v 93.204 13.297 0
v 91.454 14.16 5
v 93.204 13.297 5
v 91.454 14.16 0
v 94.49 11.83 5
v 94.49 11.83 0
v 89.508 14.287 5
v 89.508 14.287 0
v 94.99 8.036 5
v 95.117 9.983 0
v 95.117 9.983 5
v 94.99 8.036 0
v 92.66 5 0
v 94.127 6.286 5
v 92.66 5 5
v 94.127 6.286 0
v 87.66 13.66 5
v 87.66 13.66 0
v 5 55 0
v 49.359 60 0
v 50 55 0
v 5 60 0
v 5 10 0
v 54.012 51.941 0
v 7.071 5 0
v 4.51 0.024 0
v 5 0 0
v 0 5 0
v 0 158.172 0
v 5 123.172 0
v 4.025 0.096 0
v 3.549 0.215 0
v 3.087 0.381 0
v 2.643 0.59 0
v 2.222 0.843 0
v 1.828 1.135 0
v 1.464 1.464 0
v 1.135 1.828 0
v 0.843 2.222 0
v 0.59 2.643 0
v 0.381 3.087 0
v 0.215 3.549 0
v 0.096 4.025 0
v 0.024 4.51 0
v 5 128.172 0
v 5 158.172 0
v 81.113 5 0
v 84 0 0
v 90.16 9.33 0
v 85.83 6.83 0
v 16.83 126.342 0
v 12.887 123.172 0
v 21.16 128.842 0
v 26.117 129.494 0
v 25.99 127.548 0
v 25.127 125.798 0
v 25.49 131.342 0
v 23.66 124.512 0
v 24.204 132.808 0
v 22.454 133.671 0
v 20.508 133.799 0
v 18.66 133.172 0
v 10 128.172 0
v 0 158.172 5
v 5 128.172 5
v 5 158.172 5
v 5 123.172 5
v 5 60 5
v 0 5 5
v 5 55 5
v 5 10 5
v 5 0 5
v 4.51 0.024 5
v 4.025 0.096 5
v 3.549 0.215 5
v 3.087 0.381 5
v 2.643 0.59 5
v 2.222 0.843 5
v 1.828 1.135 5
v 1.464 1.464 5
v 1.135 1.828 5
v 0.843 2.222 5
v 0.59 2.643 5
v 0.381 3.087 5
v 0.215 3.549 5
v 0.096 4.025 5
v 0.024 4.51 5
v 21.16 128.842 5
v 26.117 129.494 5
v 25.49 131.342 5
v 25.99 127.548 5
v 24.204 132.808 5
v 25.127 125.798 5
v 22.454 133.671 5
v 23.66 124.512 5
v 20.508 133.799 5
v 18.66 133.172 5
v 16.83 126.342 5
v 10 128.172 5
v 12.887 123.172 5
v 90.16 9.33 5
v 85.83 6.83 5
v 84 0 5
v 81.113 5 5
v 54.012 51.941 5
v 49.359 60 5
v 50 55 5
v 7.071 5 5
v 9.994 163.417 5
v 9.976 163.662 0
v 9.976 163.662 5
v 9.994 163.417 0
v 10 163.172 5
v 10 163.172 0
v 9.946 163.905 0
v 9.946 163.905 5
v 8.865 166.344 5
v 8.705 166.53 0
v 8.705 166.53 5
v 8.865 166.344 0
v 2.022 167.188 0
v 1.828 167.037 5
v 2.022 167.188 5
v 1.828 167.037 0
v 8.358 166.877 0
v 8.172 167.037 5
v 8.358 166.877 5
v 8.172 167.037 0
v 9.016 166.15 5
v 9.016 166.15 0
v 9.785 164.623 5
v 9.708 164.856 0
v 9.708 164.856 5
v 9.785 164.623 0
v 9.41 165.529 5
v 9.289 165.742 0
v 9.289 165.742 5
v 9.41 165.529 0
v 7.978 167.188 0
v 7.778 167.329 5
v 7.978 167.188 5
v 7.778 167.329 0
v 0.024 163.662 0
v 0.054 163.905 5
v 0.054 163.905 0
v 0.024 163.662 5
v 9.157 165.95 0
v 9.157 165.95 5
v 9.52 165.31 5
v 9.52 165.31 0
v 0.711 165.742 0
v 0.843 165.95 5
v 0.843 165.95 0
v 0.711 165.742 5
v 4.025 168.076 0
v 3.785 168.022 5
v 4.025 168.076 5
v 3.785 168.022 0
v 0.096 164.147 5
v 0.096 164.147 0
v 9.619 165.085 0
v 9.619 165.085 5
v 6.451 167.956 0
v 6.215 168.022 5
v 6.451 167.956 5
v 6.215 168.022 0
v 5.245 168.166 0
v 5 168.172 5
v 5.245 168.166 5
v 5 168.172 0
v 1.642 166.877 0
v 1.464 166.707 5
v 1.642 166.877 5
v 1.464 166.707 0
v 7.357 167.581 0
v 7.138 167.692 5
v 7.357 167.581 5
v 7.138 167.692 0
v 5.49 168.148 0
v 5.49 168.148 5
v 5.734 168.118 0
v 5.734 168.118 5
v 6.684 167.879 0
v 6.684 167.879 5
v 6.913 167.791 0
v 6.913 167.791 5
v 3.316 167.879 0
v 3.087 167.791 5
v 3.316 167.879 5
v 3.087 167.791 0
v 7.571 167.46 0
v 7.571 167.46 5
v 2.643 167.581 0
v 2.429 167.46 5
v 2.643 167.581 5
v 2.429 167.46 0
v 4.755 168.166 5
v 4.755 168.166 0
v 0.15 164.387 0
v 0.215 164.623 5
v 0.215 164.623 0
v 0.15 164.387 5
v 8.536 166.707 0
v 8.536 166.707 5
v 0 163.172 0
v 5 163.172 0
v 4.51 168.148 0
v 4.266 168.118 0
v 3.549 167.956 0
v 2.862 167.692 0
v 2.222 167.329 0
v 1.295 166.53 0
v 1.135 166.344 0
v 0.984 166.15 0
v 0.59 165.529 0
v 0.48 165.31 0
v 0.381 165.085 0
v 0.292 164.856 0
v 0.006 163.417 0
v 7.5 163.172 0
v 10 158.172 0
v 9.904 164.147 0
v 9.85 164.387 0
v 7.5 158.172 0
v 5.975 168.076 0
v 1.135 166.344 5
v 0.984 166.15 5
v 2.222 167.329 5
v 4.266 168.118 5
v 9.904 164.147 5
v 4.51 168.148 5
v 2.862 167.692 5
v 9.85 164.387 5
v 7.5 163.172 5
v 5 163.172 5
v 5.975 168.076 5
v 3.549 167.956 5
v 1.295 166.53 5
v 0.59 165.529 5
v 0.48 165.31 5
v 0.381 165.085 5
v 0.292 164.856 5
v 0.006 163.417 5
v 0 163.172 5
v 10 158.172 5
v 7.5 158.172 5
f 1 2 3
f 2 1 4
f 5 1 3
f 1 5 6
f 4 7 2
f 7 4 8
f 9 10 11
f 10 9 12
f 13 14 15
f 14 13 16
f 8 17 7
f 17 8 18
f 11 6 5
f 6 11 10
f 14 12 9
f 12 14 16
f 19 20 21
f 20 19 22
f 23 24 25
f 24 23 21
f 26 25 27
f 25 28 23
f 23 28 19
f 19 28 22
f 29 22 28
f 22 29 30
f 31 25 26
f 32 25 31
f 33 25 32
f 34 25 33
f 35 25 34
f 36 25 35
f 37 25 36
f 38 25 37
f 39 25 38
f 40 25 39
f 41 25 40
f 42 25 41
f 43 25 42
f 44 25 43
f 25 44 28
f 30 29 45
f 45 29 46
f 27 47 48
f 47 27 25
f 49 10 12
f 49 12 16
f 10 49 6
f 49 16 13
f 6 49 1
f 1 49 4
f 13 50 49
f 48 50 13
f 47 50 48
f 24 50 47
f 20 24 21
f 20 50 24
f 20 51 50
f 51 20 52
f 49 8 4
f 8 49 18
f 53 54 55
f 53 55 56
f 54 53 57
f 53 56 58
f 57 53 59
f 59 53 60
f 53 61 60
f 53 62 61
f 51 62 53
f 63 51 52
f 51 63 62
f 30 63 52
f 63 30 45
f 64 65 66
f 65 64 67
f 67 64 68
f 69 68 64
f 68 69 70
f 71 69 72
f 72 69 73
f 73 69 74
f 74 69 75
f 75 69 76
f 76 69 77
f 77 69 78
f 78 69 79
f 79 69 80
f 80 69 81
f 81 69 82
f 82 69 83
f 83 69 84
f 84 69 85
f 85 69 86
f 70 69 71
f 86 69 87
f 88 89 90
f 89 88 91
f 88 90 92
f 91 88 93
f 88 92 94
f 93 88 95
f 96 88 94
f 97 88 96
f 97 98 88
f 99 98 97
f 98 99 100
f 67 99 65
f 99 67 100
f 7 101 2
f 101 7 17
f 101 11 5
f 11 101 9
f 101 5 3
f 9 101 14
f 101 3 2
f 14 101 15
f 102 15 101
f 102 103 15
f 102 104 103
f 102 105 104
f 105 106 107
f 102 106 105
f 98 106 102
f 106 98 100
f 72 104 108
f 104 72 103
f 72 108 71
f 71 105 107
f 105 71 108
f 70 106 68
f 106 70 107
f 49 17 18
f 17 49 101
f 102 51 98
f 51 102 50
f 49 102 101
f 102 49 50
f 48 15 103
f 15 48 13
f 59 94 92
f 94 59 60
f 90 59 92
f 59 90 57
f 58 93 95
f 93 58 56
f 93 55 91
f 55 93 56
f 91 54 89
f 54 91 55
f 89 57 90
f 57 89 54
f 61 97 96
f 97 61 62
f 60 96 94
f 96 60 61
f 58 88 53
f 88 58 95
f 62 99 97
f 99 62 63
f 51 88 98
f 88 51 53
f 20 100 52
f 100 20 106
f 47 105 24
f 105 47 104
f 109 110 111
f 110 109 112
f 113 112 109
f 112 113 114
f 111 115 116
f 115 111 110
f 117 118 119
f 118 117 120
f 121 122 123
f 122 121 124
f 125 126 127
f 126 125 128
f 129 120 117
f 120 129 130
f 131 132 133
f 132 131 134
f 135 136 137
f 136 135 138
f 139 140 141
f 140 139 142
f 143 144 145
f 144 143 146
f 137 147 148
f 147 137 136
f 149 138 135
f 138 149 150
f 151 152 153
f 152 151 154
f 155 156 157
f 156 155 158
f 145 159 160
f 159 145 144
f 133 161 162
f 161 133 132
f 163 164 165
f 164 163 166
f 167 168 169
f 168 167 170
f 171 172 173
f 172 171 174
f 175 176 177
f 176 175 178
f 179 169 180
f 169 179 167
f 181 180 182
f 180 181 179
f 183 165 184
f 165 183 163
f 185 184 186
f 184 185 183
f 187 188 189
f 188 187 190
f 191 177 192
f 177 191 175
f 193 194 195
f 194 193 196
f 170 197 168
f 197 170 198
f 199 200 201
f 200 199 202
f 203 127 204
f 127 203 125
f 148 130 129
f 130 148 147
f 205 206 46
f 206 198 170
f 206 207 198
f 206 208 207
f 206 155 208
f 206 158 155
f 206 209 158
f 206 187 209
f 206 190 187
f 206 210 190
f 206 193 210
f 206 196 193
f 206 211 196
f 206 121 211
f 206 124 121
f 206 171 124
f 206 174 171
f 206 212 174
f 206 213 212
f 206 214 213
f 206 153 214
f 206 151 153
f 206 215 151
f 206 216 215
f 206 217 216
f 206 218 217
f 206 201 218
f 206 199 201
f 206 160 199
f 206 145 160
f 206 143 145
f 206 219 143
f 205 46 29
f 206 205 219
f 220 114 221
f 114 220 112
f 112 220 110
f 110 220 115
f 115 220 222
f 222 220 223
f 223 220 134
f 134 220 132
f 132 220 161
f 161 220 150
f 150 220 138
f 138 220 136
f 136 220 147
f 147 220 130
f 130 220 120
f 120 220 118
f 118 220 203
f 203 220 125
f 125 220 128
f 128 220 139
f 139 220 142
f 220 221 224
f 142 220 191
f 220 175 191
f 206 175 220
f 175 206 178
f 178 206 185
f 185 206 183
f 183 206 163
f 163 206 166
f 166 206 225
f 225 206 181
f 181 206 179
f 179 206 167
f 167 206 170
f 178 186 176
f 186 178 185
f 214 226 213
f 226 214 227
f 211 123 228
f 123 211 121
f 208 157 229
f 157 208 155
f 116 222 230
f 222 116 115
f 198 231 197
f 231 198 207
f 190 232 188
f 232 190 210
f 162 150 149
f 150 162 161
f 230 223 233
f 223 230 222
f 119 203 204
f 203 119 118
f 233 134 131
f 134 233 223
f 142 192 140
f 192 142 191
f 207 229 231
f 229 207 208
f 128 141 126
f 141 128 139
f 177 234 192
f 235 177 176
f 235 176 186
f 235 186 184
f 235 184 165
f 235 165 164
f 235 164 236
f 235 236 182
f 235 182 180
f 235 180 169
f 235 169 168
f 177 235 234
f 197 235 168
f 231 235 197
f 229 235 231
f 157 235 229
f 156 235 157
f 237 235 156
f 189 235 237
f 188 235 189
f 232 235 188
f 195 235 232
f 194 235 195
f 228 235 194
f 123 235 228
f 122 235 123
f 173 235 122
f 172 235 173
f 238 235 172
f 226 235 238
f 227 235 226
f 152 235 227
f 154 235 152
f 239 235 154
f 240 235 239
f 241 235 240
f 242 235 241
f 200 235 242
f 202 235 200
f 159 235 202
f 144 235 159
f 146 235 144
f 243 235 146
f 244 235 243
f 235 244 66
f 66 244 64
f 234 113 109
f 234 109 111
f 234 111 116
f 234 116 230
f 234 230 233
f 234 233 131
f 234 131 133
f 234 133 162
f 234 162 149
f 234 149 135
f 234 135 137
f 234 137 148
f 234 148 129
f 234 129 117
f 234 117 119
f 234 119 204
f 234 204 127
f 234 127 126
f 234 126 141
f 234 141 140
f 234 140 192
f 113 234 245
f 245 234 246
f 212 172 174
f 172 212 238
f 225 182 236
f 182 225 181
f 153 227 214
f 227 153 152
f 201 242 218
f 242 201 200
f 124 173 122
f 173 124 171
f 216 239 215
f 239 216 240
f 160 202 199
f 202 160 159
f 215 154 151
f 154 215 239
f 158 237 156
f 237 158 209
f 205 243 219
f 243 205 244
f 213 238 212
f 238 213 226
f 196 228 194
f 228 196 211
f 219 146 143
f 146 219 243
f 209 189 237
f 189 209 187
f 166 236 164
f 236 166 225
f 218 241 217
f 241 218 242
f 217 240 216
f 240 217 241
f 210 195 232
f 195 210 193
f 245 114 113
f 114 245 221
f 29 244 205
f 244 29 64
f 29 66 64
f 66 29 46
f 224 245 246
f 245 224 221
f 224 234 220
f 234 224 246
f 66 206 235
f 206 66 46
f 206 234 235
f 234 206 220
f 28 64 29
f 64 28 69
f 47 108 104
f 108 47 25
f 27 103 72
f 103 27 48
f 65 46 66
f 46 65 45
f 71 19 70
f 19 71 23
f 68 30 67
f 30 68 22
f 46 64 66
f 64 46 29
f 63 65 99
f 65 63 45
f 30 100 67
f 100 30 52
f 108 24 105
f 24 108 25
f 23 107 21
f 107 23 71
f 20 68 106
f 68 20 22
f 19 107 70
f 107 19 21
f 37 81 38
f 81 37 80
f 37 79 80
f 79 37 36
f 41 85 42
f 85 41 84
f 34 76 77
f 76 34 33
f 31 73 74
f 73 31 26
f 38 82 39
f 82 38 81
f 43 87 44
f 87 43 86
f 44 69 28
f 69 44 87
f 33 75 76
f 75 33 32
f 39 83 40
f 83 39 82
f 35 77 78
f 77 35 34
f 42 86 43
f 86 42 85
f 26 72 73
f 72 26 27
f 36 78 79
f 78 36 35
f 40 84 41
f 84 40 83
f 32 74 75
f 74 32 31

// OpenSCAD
// file: settings.scad
/* true  -> place the controller housing to 
            right of the motor housing
   false -> place the controller housing below
            the motor housing
*/
side_by_side = false;

/* include a battery compartment */
with_battery_housing = true;

/* true  -> make the walls just tall enough for
            the motor
   false -> make the walls tall enough to enclose
            the controller
*/
min_height = false;

/* default wall/floor thickness */
thickness = 4;

battery_height = 23;
battery_length = 79;
battery_width = 37;
solar_controller_height = 15;
solar_controller_length = 50;

/* dimensions of NodeMCU + Motor Shield standing on edge */
controller_x = 62;
controller_y = 27;
controller_z = 45;

/* length of the motor body */
motor_l = 55;
/* diameter of the motor body */
motor_d = 26;

/* height of inserts placed above and below motor housing */
padding = 6;

/* length of thumbscrews inside the housing 
   (thumbscrews must be at thumbscrew_internal_l + thickness long)
*/
thumbscrew_internal_l = 14;

/* radius of thumbscrews */
thumbscrew_radius = 3;
/* offset of left hand thumbscrew from left inner edge of motor housing */
left_thumbscrew_offset = 8;
/* offset of right hand thumbscrew from right inner edge of motor housing */
right_thumbscrew_offset = 13;

/* radius of holes for wall mount screws */
mount_hole_r = 3;

/* internal dimensions of the motor housing. */
motor_housing_internal_x = max(motor_d + padding + thumbscrew_internal_l,
                                side_by_side ? controller_x : battery_length - (controller_y + thickness));
motor_housing_internal_y = max(motor_l + 5, side_by_side ? 0 : controller_x);

/* external dimensions of the motor housing */
motor_housing_total_x    = motor_housing_internal_x + 2*thickness;
motor_housing_total_y    = motor_housing_internal_y + 2*thickness;

internal_z = min_height ? motor_d : max(controller_z, motor_d);
total_z    = internal_z + thickness;

/* extra padding to center the motor in the Z dimension */
motor_pad = with_battery_housing ? (internal_z - solar_controller_height - motor_d) : 
            (internal_z - motor_d)/2;

mount_hole_offset = (motor_housing_internal_x / 6) ;
mount_hole_inset_r = 5;

/* settings for the thumbscrew plate */
thumbscrew_plate_inset_r= 5.75;
thumbscrew_plate_thickness = 6;
thumbscrew_plate_inset_h = 3;
thumbscrew_plate_l = motor_housing_internal_y - 1;
thumbscrew_plate_w = motor_d;

/* little module to diff with a square corner to round it out */
module chamfer(r,h){
    translate([r, r, -1]){
        rotate([0,0,180])
        difference(){
            cube([r+1,r+1,h]);
            translate([0,0,-1]){
                cylinder(r=r, h=h+2, $fn=64);
            }
        }
    }
}
// main file
include <settings.scad>

d0 = 10;
h1 = 30;
theta = 60;
thickness = 5;

hook = 10;

p  = 138 + 2*thickness;

difference(){
    union(){
        translate([p*cos(theta) + d0,0,0]){
            rotate([0,0,90-theta]){
                cube([thickness, p, thickness]);
                translate([thickness, 0, 0]){
                    cube([thickness, thickness, thickness]);
                    translate([thickness, 0, 0]){
                        intersection(){
                            translate([0,thickness, 0]){
                                cylinder(r = thickness, h=thickness);
                            }
                            cube([thickness, 2*thickness, thickness]);
                        }
                    }
                }
                translate([thickness, p - thickness, 0]){
                    cube([thickness, thickness, thickness]);
                    translate([thickness, 0, 0]){
                        intersection(){
                            cylinder(r = thickness, h=thickness);
                            translate([0,-thickness, 0]){
                                cube([thickness, 2*thickness, thickness]);
                            }
                        }
                    }
                }
            }
        }
        cube([p*cos(theta) + d0, thickness, thickness]);
        cube([thickness, p*sin(theta) + h1, thickness]);
        translate([0,p*sin(theta)-thickness,0]){
            cube([d0 + thickness, thickness, thickness]);
        }

        /* FIXME: these should actually use trig to comput the right length
           based on theta, this works ok for now. */
        translate([0,thickness, 0]){
            rotate([0,0,-45]){
                cube([thickness, 75, thickness]);
            }
        }
        translate([0,55,0]){
            cube([55, thickness, thickness]);
        }

        translate([0, p*sin(theta) + h1, 0]){
            difference(){
                union(){
                    translate([hook/2, hook/2, 0]){
                        cylinder(r = hook/2, h=thickness, $fn=128);
                    }
                    cube([hook, hook/2, thickness]);
                }
                translate([thickness, -1, -1]){
                    cube([(hook - thickness)/2, 1+hook/2, thickness + 2]);
                }
            }
        }
    }
    chamfer(thickness,thickness+2);
}
